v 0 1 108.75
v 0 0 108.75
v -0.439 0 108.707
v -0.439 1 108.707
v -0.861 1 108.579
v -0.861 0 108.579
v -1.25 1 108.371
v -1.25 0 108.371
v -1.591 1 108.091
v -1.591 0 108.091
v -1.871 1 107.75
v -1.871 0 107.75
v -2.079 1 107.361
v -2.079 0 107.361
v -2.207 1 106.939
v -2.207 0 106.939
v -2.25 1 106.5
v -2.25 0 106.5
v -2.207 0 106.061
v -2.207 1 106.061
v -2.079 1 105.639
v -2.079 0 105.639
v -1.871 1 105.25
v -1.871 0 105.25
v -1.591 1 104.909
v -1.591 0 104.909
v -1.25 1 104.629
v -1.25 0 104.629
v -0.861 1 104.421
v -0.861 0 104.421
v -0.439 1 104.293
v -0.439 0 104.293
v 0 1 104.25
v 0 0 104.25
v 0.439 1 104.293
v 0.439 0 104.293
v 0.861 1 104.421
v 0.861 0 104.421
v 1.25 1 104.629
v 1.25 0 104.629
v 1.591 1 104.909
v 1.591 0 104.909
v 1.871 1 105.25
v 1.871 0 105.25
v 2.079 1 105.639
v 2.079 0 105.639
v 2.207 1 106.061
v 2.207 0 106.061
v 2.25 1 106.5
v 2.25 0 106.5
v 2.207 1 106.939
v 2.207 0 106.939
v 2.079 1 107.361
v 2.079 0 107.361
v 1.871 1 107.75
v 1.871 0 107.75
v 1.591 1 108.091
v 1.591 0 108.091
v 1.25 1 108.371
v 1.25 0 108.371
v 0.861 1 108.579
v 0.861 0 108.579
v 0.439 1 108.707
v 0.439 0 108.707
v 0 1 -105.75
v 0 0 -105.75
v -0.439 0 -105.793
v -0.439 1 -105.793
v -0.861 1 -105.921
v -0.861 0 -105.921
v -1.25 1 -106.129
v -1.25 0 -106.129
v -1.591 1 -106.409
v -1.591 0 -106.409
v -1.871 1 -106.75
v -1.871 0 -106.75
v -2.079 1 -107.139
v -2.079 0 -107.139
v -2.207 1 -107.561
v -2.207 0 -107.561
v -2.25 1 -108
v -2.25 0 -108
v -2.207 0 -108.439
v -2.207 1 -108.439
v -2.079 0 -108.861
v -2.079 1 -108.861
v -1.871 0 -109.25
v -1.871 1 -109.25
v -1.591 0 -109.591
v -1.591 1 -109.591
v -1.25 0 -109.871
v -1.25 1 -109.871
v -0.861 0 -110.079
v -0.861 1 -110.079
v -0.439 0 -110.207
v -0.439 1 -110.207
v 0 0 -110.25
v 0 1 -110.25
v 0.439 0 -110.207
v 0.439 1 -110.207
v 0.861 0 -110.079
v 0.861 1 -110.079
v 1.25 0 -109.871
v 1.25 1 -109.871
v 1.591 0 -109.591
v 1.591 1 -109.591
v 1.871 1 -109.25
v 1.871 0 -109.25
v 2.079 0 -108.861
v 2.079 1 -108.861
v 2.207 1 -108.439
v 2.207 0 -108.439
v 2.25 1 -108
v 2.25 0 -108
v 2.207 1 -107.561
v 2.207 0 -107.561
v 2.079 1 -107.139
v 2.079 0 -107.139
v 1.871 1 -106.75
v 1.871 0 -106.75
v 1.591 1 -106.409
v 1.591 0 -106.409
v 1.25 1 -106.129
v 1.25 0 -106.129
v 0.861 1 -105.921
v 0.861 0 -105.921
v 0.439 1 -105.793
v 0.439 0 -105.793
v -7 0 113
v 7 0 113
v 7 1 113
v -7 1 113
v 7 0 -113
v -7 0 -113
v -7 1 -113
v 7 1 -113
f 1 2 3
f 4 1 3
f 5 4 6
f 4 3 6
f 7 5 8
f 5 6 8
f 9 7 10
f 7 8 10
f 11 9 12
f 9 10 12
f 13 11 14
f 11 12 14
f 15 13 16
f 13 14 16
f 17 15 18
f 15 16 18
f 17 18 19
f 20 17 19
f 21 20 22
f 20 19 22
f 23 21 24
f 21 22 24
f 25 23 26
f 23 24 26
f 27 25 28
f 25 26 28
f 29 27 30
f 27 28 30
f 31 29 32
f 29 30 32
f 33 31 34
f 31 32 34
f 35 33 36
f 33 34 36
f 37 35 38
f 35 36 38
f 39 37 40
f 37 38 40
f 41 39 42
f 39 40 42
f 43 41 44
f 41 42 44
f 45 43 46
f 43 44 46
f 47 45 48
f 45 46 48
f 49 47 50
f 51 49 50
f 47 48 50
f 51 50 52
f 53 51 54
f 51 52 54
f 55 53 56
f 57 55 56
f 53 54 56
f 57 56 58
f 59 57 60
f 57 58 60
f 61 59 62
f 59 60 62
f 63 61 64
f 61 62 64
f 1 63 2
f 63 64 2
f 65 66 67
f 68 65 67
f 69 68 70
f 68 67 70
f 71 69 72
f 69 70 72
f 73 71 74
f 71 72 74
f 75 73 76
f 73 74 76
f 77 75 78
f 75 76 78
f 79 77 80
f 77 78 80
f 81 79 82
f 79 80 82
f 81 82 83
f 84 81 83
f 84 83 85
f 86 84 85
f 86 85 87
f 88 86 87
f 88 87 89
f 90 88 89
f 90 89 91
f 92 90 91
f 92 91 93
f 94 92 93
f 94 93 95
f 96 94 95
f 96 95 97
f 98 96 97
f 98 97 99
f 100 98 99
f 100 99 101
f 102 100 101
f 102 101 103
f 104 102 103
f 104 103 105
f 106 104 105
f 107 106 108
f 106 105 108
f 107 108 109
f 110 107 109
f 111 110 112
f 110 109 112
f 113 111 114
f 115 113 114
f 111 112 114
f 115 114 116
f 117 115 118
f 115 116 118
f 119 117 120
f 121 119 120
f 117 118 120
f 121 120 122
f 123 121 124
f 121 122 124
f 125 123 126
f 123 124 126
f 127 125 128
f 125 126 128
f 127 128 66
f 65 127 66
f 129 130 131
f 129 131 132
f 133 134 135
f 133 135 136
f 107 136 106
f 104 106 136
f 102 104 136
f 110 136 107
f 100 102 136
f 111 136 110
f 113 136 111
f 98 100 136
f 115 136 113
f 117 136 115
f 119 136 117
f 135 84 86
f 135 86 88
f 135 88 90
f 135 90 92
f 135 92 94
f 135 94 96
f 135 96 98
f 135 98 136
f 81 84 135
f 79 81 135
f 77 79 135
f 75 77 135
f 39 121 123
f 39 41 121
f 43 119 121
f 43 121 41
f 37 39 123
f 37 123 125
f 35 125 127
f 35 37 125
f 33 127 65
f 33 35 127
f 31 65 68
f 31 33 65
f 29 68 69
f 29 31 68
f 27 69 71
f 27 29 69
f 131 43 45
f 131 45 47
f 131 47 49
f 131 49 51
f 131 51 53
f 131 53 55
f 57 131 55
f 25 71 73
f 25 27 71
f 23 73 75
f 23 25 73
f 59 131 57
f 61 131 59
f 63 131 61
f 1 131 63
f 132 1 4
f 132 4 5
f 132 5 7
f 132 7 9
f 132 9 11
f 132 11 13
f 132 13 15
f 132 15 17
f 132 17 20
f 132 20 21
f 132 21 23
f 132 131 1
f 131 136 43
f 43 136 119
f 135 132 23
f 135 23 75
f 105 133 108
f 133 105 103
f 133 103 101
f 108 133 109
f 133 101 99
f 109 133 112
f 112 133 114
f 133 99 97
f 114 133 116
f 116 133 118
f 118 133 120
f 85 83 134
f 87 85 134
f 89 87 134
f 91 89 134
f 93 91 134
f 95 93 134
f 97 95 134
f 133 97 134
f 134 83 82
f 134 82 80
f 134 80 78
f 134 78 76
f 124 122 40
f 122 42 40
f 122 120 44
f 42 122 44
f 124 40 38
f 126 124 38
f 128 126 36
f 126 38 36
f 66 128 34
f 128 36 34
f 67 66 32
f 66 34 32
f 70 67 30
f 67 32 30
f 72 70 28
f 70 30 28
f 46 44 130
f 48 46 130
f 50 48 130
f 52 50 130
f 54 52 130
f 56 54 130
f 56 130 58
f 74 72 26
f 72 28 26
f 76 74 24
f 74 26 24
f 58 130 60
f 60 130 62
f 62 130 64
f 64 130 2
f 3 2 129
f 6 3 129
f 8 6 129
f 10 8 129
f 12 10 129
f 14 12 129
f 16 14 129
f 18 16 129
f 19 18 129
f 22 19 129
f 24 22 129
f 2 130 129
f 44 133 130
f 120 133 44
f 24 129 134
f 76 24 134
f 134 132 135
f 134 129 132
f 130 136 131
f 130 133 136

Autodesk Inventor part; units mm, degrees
ref_plane "YZ Plane" through (0, 0, 0) normal (1, 0, 0) x (0, 1, 0)
ref_plane "XZ Plane" through (0, 0, 0) normal (0, 1, 0) x (-1, 0, 0)
ref_plane "XY Plane" through (0, 0, 0) normal (0, 0, 1) x (1, 0, 0)
sketch "Esquisse2" plane through (0, 0, 0) normal (0, 1, 0) x (-1, 0, 0)
  line L0 (-7, 113) -> (7, 113)
  line L1 (7, 113) -> (7, -113)
  line L2 (7, -113) -> (-7, -113)
  line L3 (-7, -113) -> (-7, 113)
  line L4 (-7, 113) -> (7, -113) construction
  line L5 (7, 113) -> (-7, -113) construction
  point P0 (0, 0)
  dimension "d0" = 226
  dimension "d1" = 14
extrude "Extrusion1" add sketch "Esquisse2" along normal blind 1
sketch "Esquisse3" plane through (0, 1, 0) normal (0, 1, 0) x (1, 0, 0)
  line L0 (7, 113) -> (-7, 113) projected
  line L1 (-7, -113) -> (7, -113) projected
  point P0 (0, 0)
  point P1 (0, -106.5)
  point P2 (0, 108)
  dimension "d4" = 5
  dimension "d14" = 214.5
hole "Perçage1" at (0, 1, 106.5) at (0, 1, -108) direction (0, -1, 0) diameter 4.5 end through all clearance for "Vis d'assemblage à six pans creux ISO 4762" size "M4" standard "ISO"
properties part number "support_lateral" material "Aluminium 6061"
